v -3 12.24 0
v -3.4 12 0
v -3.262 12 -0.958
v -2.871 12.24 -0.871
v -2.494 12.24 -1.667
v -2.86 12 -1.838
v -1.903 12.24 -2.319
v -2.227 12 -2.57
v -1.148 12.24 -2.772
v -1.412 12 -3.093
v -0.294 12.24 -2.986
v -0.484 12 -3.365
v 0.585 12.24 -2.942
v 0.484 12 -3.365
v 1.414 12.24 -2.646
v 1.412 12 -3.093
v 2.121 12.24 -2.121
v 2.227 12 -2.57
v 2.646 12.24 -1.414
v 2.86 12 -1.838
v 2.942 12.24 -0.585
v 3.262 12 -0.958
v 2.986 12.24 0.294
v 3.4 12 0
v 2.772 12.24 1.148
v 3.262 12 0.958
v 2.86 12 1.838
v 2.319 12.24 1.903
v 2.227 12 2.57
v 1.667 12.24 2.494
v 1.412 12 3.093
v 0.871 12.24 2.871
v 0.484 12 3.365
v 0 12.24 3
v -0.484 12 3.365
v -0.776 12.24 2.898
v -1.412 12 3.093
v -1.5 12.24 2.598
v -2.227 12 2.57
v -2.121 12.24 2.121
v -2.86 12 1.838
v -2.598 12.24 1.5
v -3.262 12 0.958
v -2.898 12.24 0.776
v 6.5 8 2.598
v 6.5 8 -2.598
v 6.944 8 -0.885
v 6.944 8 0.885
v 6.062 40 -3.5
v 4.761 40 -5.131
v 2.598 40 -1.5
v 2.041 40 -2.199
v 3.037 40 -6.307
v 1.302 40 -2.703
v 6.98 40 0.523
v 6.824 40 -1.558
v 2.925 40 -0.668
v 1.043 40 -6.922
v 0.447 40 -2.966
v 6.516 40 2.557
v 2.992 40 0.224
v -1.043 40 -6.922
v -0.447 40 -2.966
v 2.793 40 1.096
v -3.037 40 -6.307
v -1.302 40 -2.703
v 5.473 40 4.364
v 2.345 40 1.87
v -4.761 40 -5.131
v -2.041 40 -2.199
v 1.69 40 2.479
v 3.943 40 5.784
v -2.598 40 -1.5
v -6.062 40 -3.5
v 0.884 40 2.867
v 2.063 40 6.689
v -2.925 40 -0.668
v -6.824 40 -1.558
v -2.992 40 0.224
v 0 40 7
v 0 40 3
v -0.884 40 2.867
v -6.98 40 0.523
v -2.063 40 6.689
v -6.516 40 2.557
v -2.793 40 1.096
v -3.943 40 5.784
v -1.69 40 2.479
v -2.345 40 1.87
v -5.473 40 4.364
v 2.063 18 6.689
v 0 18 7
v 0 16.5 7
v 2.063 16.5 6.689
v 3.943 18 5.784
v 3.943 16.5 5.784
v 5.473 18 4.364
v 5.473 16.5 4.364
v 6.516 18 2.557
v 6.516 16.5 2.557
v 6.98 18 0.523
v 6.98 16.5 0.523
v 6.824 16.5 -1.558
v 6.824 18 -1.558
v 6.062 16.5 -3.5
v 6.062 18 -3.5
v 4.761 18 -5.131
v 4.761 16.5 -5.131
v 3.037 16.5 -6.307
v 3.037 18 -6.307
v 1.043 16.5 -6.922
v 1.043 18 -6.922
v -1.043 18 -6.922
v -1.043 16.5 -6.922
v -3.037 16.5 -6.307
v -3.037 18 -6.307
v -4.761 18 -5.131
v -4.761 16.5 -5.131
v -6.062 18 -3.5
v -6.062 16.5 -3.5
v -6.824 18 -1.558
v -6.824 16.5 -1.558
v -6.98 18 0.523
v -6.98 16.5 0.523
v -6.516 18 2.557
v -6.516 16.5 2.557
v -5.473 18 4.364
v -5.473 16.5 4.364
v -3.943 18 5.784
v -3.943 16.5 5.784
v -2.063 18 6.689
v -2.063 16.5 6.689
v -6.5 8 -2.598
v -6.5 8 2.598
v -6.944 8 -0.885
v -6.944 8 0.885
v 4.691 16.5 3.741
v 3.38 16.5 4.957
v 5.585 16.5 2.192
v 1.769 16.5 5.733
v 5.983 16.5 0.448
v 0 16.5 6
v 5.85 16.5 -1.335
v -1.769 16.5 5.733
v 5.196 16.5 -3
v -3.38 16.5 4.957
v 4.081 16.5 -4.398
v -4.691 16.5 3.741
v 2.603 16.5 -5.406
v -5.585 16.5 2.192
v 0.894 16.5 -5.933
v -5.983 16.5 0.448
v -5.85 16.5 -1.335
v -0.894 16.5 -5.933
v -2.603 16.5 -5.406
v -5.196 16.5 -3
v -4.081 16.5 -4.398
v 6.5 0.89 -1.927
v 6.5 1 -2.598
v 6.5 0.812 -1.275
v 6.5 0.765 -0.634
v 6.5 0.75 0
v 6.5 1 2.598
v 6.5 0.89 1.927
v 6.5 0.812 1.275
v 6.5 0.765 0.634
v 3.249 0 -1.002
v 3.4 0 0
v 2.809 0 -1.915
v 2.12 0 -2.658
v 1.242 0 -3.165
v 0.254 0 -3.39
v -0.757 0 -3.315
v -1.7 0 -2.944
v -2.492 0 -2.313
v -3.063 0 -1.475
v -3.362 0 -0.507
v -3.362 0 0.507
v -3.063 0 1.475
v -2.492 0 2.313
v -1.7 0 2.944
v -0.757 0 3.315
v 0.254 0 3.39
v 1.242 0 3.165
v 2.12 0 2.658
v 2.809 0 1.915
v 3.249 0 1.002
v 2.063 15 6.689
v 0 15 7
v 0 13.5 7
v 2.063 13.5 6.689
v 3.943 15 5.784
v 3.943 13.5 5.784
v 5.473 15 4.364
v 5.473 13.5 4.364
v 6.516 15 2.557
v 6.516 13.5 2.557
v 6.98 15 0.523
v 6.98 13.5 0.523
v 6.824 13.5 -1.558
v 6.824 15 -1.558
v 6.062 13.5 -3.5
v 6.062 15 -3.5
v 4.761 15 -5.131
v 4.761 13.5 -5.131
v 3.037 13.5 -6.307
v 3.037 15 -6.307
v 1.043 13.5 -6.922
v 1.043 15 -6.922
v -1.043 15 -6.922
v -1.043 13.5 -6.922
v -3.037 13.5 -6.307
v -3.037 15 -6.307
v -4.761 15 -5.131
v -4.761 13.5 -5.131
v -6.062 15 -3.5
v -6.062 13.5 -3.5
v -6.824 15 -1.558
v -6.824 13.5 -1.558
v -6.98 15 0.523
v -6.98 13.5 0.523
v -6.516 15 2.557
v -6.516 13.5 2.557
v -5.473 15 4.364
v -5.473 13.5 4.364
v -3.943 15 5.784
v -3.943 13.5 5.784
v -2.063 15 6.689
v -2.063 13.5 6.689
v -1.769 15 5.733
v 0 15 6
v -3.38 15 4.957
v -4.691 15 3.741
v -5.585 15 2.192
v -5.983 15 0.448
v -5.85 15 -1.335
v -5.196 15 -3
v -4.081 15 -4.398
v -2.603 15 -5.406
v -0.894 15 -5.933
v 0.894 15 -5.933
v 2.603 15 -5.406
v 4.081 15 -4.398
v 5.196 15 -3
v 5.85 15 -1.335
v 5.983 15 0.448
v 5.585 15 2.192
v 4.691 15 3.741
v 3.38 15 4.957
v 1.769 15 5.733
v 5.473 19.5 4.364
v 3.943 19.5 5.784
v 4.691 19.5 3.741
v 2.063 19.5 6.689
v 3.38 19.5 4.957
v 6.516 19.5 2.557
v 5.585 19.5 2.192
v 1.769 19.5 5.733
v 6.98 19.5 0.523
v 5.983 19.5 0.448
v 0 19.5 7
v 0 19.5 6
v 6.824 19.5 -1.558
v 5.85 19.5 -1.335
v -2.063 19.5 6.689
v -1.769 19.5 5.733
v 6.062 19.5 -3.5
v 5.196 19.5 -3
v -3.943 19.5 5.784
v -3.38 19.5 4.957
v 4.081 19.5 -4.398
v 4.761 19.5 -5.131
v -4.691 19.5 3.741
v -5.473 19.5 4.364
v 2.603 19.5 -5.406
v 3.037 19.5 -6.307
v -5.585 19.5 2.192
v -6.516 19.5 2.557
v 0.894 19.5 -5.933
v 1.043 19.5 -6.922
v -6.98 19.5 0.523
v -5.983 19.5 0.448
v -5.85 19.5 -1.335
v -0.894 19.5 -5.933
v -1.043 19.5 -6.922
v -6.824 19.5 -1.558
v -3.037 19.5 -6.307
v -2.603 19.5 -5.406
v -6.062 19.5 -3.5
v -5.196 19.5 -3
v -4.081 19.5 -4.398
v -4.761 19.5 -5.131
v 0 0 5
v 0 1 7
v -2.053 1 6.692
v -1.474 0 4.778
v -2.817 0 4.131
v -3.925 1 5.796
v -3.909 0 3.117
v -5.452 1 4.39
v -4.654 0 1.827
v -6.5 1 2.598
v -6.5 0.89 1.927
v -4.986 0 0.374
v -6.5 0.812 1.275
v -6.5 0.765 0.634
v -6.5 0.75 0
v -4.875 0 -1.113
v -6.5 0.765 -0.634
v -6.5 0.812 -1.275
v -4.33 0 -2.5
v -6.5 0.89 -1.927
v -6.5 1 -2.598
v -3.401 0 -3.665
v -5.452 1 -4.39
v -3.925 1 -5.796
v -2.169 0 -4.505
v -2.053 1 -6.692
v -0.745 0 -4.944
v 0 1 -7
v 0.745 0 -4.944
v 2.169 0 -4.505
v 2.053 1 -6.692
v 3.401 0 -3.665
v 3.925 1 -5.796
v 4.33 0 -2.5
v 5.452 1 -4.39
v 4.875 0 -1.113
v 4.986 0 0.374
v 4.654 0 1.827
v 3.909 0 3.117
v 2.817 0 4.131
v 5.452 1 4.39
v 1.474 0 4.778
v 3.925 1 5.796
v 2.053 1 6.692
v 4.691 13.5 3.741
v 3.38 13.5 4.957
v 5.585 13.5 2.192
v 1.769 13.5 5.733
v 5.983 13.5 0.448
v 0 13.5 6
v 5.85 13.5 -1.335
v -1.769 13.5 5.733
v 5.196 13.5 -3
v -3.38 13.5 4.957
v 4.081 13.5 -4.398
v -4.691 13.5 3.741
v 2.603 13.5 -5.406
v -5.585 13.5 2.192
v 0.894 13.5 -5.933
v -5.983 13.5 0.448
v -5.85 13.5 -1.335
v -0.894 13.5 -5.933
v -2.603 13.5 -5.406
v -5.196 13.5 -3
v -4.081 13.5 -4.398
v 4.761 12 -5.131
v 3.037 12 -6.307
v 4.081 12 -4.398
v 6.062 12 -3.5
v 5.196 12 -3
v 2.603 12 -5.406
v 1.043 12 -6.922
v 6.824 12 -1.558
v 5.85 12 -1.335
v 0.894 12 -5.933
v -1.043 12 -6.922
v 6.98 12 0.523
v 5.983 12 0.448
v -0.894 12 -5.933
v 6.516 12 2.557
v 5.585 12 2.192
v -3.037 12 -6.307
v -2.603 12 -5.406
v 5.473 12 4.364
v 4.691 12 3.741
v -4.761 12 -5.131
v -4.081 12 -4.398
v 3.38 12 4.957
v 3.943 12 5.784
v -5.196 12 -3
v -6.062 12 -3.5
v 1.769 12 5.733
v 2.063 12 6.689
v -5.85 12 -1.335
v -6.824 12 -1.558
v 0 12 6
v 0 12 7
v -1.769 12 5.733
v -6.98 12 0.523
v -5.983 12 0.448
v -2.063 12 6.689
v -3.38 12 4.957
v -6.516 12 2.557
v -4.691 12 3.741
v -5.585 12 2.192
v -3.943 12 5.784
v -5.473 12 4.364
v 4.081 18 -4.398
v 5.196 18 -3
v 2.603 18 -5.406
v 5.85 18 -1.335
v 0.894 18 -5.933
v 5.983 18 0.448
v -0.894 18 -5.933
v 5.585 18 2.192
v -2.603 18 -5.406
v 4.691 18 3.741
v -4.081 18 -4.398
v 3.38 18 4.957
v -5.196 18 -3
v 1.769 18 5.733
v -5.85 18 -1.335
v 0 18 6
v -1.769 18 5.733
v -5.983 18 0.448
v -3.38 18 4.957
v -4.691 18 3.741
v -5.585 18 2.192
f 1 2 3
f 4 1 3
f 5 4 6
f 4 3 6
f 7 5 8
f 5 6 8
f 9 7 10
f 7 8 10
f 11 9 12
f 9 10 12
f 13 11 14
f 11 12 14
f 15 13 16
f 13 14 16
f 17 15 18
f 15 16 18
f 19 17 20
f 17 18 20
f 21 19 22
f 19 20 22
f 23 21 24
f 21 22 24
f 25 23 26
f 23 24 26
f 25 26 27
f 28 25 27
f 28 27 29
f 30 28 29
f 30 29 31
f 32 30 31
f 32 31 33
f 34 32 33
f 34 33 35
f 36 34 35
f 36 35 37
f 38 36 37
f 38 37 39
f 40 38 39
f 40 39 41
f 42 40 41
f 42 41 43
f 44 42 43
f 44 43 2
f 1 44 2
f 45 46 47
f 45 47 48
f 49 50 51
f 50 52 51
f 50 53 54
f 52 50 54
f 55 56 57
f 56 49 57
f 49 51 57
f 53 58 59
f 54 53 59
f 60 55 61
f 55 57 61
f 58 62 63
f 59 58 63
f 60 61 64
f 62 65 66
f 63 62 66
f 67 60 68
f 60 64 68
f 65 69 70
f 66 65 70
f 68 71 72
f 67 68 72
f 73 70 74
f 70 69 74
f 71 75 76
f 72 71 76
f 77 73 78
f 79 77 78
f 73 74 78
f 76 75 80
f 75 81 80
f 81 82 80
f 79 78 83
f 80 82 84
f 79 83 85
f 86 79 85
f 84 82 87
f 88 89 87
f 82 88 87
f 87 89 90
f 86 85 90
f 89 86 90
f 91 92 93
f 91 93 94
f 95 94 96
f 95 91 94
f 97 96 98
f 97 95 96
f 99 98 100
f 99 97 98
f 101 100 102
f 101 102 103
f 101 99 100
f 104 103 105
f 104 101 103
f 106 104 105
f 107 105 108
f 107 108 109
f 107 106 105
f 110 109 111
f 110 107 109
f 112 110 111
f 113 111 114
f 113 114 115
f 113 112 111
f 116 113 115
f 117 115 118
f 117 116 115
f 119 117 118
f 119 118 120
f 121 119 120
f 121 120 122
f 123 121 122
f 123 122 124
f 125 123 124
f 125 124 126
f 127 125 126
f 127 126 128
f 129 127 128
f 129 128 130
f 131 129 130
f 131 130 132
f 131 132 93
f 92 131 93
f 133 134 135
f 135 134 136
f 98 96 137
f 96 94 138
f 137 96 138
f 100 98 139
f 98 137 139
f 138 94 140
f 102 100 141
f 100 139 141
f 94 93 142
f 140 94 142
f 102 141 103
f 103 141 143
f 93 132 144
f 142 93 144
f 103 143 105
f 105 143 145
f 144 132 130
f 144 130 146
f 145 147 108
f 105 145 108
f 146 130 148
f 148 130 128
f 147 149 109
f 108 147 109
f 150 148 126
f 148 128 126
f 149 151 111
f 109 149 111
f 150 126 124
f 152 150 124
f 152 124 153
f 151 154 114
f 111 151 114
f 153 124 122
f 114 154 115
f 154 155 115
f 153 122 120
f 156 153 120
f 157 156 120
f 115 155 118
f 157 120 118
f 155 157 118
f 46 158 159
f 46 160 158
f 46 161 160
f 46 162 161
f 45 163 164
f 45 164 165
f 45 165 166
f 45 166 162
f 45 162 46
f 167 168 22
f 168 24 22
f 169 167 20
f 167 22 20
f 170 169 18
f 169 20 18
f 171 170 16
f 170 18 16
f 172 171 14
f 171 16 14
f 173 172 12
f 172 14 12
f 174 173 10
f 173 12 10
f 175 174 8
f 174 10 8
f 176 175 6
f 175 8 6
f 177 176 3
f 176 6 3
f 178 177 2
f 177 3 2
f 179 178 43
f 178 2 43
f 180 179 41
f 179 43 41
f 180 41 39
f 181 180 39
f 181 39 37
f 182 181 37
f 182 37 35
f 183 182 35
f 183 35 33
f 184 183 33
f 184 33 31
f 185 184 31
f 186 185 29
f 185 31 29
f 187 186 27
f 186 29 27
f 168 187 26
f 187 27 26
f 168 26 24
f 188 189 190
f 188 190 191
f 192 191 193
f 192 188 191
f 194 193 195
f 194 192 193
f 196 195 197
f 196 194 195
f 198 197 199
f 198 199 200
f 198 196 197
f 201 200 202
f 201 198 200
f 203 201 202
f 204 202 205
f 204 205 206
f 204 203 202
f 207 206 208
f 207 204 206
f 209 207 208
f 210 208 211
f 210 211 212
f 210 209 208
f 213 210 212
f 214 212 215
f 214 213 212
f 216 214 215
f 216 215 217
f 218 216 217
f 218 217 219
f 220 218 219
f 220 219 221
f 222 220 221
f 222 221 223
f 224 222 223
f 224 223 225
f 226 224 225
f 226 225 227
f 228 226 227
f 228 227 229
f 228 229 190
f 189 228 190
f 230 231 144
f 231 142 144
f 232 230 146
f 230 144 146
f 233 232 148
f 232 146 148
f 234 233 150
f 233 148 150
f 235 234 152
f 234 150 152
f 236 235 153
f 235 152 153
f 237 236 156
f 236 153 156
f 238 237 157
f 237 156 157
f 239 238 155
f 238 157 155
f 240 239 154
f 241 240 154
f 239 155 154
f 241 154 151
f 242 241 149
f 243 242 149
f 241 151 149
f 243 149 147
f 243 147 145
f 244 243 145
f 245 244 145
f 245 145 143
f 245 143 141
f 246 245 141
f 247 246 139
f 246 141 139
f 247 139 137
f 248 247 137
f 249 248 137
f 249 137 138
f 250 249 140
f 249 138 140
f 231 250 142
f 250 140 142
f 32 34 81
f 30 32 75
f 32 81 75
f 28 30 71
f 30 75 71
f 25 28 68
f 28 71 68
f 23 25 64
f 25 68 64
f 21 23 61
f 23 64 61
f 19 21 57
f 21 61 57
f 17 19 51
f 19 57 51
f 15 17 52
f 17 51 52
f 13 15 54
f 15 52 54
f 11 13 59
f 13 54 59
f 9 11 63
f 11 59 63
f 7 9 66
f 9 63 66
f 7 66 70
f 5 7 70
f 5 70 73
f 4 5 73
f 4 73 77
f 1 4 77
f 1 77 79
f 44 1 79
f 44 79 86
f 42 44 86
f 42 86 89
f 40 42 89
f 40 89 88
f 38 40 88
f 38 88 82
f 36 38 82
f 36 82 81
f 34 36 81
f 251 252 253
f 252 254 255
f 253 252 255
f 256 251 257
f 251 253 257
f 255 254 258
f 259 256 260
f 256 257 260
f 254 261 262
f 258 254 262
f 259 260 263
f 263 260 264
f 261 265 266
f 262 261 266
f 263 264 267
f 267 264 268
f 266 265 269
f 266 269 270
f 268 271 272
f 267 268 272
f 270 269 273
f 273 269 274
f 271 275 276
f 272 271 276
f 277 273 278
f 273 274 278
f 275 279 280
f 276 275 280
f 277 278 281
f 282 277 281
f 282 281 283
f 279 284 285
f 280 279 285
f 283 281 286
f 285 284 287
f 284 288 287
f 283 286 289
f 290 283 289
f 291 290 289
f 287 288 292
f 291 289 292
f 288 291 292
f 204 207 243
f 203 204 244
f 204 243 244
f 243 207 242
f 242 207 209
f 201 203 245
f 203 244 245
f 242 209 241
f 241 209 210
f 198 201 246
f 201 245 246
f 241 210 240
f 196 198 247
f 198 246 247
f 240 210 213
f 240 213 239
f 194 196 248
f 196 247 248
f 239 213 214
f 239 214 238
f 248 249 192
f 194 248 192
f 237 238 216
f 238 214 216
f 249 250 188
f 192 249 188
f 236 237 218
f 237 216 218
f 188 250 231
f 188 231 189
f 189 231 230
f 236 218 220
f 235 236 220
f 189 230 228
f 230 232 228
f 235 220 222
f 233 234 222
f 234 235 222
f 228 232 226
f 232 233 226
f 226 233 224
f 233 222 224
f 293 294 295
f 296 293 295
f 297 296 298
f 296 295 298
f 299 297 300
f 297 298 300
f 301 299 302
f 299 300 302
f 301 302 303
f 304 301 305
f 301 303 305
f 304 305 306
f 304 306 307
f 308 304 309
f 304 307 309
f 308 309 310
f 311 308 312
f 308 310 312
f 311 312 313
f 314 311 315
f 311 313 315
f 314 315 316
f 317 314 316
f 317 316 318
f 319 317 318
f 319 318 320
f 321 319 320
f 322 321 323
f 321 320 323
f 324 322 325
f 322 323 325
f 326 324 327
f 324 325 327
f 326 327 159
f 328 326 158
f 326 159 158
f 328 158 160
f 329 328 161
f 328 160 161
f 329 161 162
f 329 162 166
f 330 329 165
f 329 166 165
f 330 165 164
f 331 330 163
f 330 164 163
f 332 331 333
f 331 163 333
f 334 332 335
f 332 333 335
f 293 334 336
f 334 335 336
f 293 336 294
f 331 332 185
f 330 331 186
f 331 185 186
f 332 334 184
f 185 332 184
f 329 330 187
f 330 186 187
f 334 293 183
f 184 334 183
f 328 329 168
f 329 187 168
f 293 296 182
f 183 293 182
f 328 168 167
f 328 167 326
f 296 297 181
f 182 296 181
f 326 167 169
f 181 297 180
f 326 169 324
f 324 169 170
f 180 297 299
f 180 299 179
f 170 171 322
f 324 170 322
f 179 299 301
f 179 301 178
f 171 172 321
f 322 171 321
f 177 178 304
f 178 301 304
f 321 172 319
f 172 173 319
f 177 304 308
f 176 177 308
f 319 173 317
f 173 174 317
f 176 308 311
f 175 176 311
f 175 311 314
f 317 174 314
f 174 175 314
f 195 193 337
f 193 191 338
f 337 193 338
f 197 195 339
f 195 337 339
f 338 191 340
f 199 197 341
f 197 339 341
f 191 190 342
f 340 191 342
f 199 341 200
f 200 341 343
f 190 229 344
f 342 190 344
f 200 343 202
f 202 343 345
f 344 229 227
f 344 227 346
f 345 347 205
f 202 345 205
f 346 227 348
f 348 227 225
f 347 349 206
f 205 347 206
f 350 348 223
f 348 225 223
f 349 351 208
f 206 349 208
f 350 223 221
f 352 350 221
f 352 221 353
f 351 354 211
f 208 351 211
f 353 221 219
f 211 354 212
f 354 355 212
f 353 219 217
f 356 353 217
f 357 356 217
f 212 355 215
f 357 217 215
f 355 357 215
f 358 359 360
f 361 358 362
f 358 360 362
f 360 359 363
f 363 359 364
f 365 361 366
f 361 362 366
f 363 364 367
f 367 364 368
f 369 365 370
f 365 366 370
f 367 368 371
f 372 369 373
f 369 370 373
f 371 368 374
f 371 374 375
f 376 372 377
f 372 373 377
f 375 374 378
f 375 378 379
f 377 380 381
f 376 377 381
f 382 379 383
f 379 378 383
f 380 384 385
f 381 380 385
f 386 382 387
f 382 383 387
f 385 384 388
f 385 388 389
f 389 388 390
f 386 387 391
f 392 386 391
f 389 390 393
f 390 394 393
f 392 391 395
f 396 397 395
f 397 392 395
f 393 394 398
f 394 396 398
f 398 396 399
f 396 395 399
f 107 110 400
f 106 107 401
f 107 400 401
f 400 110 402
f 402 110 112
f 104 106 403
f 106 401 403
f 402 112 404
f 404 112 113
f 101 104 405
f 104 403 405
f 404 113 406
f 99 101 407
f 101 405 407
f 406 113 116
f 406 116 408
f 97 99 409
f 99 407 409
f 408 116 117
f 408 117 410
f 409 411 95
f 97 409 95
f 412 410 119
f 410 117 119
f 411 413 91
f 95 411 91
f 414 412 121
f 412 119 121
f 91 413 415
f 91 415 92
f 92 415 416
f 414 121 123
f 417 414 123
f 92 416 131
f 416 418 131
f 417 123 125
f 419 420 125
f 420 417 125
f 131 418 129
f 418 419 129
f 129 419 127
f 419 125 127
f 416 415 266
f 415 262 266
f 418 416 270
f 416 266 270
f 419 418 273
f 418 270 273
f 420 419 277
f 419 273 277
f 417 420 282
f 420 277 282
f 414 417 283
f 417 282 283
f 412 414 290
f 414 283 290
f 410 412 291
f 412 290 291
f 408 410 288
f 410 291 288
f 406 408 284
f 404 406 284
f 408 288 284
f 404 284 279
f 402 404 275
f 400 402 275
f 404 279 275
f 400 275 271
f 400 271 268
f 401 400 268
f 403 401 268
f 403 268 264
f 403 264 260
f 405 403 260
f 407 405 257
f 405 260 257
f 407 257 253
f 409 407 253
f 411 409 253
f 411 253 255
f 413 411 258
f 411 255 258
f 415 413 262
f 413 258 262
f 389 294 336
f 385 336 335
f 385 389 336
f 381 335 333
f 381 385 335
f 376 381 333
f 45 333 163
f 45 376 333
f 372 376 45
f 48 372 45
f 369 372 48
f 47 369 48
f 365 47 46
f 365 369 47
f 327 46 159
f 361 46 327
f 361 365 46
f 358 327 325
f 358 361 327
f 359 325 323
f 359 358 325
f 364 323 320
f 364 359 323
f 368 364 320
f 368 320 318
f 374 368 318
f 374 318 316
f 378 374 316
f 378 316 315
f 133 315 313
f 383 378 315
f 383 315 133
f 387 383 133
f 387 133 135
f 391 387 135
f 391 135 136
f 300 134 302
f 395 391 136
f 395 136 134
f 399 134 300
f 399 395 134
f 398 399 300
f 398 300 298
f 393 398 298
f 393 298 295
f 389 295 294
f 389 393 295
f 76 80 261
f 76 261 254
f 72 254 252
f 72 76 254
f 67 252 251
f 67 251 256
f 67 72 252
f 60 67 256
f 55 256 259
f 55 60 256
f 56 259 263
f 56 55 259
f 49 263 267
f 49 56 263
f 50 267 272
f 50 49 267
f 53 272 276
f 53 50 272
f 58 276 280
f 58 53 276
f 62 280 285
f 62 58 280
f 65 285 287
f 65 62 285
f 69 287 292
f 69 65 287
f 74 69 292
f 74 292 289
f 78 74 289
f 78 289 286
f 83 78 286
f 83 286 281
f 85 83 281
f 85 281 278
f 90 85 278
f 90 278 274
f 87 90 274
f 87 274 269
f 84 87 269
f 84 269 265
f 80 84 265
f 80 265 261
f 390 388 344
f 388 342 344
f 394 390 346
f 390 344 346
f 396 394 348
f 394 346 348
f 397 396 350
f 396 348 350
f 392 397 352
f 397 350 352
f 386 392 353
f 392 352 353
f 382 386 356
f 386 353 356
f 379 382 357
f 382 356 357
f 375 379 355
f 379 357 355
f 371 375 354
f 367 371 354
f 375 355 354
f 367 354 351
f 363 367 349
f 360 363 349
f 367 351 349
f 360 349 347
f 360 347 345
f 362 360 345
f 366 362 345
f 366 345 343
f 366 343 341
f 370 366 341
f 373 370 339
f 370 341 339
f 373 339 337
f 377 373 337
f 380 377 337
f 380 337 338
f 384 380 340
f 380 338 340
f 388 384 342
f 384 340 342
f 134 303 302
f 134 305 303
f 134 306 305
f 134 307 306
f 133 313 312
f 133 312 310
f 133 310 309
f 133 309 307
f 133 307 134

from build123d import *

# Parameters (mm, degrees)
TAGLIO_ESTRUSIONE1_REACH                  = 43.569
TAGLIO_ESTRUSIONE1_END_RADIUS             = 8
SCHIZZO2_W                                = 1.5
SCHIZZO2_H                                = 8
TAGLIO_ESTRUSIONE1_DIRECTION_2_REACH      = 43.569
TAGLIO_ESTRUSIONE1_DIRECTION_2_END_RADIUS = 8
SCHIZZO7_R                                = 3
TAGLIO_ESTRUSIONE2_DEPTH                  = 42.569219382
FORO_FILETTATO_M8_1_D                     = 6.8
FORO_FILETTATO_M8_1_DEPTH                 = 12
FORO_FILETTATO_M8_1_TIP                   = 2.042926105
TAGLIO_ESTRUSIONE3_REACH                  = 43.569
SCHIZZO10_R                               = 8
SCHIZZO10_R_2                             = 7
ESTRUSIONE_ESTRUSIONE1_START              = 4.6
SCHIZZO11_R                               = 7
ESTRUSIONE_ESTRUSIONE1_DEPTH              = 4.6
SCHIZZO12_R                               = 3
TAGLIO_ESTRUSIONE4_DEPTH                  = 5


with BuildPart() as part:
    # Schizzo1 → Rivoluzione1 (revolve)
    with BuildSketch(Plane.XY, mode=Mode.PRIVATE) as rivoluzione1_sk:
        Polygon((0, 0), (-5, 0), (-8, 1.5), (-8, 12), (-6, 12), (-6, 13.5), (-8, 13.5), (-8, 15), (-6, 15), (-6, 16.5), (-8, 16.5), (-8, 18), (-6, 18), (-6, 19.5), (-8, 19.5), (-8, 30.6), (-6, 30.6), (-6, 35.2), (-8, 35.2), (-8, 40), (0, 40), align=None)
    revolve(rivoluzione1_sk.sketch.rotate(Axis((0, 129.407380346, 0), (0, -1, 0)), 270), axis=Axis((0, 129.407380346, 0), (0, -1, 0)))

    # Taglio-Estrusione1: up to this cylinder (the profile starts inside it)
    taglio_estrusione1_end = Plane(origin=(0, 4, 0), z_dir=(0, 1, 0)) * Cylinder(TAGLIO_ESTRUSIONE1_END_RADIUS, 104.138, mode=Mode.PRIVATE)
    # Schizzo2 → Taglio-Estrusione1 (cut, up to the surface)
    with BuildSketch(Plane.XY, mode=Mode.PRIVATE) as taglio_estrusione1_sk1:
        with Locations((-7.25, 4)):
            Rectangle(SCHIZZO2_W, SCHIZZO2_H)
    taglio_estrusione1_tool1 = extrude(taglio_estrusione1_sk1.sketch, amount=-TAGLIO_ESTRUSIONE1_REACH, mode=Mode.PRIVATE) & taglio_estrusione1_end
    add(taglio_estrusione1_tool1.solids().sort_by_distance((-7.25, 4, 0))[0], mode=Mode.SUBTRACT)
    # Schizzo2 → Taglio-Estrusione1 (cut, up to the surface)
    with BuildSketch(Plane.XY, mode=Mode.PRIVATE) as taglio_estrusione1_sk2:
        with Locations((7.25, 4)):
            Rectangle(SCHIZZO2_W, SCHIZZO2_H)
    taglio_estrusione1_tool2 = extrude(taglio_estrusione1_sk2.sketch, amount=-TAGLIO_ESTRUSIONE1_REACH, mode=Mode.PRIVATE) & taglio_estrusione1_end
    add(taglio_estrusione1_tool2.solids().sort_by_distance((7.25, 4, 0))[0], mode=Mode.SUBTRACT)

    # Taglio-Estrusione1 direction 2: up to this cylinder (the profile starts inside it)
    taglio_estrusione1_direction_2_end = Plane(origin=(0, 4, 0), z_dir=(0, 1, 0)) * Cylinder(TAGLIO_ESTRUSIONE1_DIRECTION_2_END_RADIUS, 104.138, mode=Mode.PRIVATE)
    # Schizzo2 → Taglio-Estrusione1 direction 2 (cut, up to the surface)
    with BuildSketch(Plane.XY, mode=Mode.PRIVATE) as taglio_estrusione1_direction_2_sk1:
        with Locations((-7.25, 4)):
            Rectangle(SCHIZZO2_W, SCHIZZO2_H)
    taglio_estrusione1_direction_2_tool1 = extrude(taglio_estrusione1_direction_2_sk1.sketch, amount=TAGLIO_ESTRUSIONE1_DIRECTION_2_REACH, mode=Mode.PRIVATE) & taglio_estrusione1_direction_2_end
    add(taglio_estrusione1_direction_2_tool1.solids().sort_by_distance((-7.25, 4, 0))[0], mode=Mode.SUBTRACT)
    # Schizzo2 → Taglio-Estrusione1 direction 2 (cut, up to the surface)
    with BuildSketch(Plane.XY, mode=Mode.PRIVATE) as taglio_estrusione1_direction_2_sk2:
        with Locations((7.25, 4)):
            Rectangle(SCHIZZO2_W, SCHIZZO2_H)
    taglio_estrusione1_direction_2_tool2 = extrude(taglio_estrusione1_direction_2_sk2.sketch, amount=TAGLIO_ESTRUSIONE1_DIRECTION_2_REACH, mode=Mode.PRIVATE) & taglio_estrusione1_direction_2_end
    add(taglio_estrusione1_direction_2_tool2.solids().sort_by_distance((7.25, 4, 0))[0], mode=Mode.SUBTRACT)

    # Schizzo7 → Taglio-Estrusione2 (cut, through all)
    with BuildSketch(Plane(origin=(0, 40, 0), x_dir=(1, 0, 0), z_dir=(0, 1, 0))):
        with Locations(Location((0, 0, 0), (0, 0, 270))):
            Circle(SCHIZZO7_R)
    extrude(amount=-TAGLIO_ESTRUSIONE2_DEPTH, mode=Mode.SUBTRACT)

    # Foro filettato M8-1
    with Locations(Plane(origin=(0, 0, 0), x_dir=(-1, 0, 0), z_dir=(0, -1, 0))):
        with Locations((0, 0)):
            Hole(FORO_FILETTATO_M8_1_D / 2, depth=FORO_FILETTATO_M8_1_DEPTH)
            with Locations((0, 0, -(FORO_FILETTATO_M8_1_DEPTH + FORO_FILETTATO_M8_1_TIP / 2))):  # 118° drill point
                Cone(0, FORO_FILETTATO_M8_1_D / 2, FORO_FILETTATO_M8_1_TIP, mode=Mode.SUBTRACT)

    # Taglio-Estrusione3: up to this face of the body (flat: up to its plane)
    taglio_estrusione3_end = Plane(part.part.faces().sort_by_distance((0, 0, -4.858578644))[0])
    # Schizzo10 → Taglio-Estrusione3 (cut, up to the picked face)
    with BuildSketch(Plane(origin=(0, 40, 0), x_dir=(1, 0, 0), z_dir=(0, 1, 0)), mode=Mode.PRIVATE) as taglio_estrusione3_sk1:
        Circle(SCHIZZO10_R)
        with Locations(Location((0, 0, 0), (0, 0, 270))):
            Circle(SCHIZZO10_R_2, mode=Mode.SUBTRACT)
    taglio_estrusione3_tool1 = split(extrude(taglio_estrusione3_sk1.sketch, amount=-TAGLIO_ESTRUSIONE3_REACH, mode=Mode.PRIVATE), bisect_by=taglio_estrusione3_end, keep=Keep.BOTH, mode=Mode.PRIVATE)
    add(taglio_estrusione3_tool1.solids().sort_by(Axis((-7.773726, 40, 0), (0, -1, 0)))[0], mode=Mode.SUBTRACT)

    # Schizzo11 → Estrusione-Estrusione1 (add)
    with BuildSketch(Plane(origin=(0, 30.6, 0), x_dir=(1, 0, 0), z_dir=(0, 1, 0)).offset(ESTRUSIONE_ESTRUSIONE1_START)):
        with Locations(Location((0, 0, 0), (0, 0, 270))):
            Circle(SCHIZZO11_R)
    extrude(amount=-ESTRUSIONE_ESTRUSIONE1_DEPTH)

    # Schizzo12 → Taglio-Estrusione4 (cut)
    with BuildSketch(Plane(origin=(0, 35.2, 0), x_dir=(1, 0, 0), z_dir=(0, 1, 0))):
        with Locations(Location((0, 0, 0), (0, 0, 270))):
            Circle(SCHIZZO12_R)
    extrude(amount=-TAGLIO_ESTRUSIONE4_DEPTH, mode=Mode.SUBTRACT)


solid = part.part
